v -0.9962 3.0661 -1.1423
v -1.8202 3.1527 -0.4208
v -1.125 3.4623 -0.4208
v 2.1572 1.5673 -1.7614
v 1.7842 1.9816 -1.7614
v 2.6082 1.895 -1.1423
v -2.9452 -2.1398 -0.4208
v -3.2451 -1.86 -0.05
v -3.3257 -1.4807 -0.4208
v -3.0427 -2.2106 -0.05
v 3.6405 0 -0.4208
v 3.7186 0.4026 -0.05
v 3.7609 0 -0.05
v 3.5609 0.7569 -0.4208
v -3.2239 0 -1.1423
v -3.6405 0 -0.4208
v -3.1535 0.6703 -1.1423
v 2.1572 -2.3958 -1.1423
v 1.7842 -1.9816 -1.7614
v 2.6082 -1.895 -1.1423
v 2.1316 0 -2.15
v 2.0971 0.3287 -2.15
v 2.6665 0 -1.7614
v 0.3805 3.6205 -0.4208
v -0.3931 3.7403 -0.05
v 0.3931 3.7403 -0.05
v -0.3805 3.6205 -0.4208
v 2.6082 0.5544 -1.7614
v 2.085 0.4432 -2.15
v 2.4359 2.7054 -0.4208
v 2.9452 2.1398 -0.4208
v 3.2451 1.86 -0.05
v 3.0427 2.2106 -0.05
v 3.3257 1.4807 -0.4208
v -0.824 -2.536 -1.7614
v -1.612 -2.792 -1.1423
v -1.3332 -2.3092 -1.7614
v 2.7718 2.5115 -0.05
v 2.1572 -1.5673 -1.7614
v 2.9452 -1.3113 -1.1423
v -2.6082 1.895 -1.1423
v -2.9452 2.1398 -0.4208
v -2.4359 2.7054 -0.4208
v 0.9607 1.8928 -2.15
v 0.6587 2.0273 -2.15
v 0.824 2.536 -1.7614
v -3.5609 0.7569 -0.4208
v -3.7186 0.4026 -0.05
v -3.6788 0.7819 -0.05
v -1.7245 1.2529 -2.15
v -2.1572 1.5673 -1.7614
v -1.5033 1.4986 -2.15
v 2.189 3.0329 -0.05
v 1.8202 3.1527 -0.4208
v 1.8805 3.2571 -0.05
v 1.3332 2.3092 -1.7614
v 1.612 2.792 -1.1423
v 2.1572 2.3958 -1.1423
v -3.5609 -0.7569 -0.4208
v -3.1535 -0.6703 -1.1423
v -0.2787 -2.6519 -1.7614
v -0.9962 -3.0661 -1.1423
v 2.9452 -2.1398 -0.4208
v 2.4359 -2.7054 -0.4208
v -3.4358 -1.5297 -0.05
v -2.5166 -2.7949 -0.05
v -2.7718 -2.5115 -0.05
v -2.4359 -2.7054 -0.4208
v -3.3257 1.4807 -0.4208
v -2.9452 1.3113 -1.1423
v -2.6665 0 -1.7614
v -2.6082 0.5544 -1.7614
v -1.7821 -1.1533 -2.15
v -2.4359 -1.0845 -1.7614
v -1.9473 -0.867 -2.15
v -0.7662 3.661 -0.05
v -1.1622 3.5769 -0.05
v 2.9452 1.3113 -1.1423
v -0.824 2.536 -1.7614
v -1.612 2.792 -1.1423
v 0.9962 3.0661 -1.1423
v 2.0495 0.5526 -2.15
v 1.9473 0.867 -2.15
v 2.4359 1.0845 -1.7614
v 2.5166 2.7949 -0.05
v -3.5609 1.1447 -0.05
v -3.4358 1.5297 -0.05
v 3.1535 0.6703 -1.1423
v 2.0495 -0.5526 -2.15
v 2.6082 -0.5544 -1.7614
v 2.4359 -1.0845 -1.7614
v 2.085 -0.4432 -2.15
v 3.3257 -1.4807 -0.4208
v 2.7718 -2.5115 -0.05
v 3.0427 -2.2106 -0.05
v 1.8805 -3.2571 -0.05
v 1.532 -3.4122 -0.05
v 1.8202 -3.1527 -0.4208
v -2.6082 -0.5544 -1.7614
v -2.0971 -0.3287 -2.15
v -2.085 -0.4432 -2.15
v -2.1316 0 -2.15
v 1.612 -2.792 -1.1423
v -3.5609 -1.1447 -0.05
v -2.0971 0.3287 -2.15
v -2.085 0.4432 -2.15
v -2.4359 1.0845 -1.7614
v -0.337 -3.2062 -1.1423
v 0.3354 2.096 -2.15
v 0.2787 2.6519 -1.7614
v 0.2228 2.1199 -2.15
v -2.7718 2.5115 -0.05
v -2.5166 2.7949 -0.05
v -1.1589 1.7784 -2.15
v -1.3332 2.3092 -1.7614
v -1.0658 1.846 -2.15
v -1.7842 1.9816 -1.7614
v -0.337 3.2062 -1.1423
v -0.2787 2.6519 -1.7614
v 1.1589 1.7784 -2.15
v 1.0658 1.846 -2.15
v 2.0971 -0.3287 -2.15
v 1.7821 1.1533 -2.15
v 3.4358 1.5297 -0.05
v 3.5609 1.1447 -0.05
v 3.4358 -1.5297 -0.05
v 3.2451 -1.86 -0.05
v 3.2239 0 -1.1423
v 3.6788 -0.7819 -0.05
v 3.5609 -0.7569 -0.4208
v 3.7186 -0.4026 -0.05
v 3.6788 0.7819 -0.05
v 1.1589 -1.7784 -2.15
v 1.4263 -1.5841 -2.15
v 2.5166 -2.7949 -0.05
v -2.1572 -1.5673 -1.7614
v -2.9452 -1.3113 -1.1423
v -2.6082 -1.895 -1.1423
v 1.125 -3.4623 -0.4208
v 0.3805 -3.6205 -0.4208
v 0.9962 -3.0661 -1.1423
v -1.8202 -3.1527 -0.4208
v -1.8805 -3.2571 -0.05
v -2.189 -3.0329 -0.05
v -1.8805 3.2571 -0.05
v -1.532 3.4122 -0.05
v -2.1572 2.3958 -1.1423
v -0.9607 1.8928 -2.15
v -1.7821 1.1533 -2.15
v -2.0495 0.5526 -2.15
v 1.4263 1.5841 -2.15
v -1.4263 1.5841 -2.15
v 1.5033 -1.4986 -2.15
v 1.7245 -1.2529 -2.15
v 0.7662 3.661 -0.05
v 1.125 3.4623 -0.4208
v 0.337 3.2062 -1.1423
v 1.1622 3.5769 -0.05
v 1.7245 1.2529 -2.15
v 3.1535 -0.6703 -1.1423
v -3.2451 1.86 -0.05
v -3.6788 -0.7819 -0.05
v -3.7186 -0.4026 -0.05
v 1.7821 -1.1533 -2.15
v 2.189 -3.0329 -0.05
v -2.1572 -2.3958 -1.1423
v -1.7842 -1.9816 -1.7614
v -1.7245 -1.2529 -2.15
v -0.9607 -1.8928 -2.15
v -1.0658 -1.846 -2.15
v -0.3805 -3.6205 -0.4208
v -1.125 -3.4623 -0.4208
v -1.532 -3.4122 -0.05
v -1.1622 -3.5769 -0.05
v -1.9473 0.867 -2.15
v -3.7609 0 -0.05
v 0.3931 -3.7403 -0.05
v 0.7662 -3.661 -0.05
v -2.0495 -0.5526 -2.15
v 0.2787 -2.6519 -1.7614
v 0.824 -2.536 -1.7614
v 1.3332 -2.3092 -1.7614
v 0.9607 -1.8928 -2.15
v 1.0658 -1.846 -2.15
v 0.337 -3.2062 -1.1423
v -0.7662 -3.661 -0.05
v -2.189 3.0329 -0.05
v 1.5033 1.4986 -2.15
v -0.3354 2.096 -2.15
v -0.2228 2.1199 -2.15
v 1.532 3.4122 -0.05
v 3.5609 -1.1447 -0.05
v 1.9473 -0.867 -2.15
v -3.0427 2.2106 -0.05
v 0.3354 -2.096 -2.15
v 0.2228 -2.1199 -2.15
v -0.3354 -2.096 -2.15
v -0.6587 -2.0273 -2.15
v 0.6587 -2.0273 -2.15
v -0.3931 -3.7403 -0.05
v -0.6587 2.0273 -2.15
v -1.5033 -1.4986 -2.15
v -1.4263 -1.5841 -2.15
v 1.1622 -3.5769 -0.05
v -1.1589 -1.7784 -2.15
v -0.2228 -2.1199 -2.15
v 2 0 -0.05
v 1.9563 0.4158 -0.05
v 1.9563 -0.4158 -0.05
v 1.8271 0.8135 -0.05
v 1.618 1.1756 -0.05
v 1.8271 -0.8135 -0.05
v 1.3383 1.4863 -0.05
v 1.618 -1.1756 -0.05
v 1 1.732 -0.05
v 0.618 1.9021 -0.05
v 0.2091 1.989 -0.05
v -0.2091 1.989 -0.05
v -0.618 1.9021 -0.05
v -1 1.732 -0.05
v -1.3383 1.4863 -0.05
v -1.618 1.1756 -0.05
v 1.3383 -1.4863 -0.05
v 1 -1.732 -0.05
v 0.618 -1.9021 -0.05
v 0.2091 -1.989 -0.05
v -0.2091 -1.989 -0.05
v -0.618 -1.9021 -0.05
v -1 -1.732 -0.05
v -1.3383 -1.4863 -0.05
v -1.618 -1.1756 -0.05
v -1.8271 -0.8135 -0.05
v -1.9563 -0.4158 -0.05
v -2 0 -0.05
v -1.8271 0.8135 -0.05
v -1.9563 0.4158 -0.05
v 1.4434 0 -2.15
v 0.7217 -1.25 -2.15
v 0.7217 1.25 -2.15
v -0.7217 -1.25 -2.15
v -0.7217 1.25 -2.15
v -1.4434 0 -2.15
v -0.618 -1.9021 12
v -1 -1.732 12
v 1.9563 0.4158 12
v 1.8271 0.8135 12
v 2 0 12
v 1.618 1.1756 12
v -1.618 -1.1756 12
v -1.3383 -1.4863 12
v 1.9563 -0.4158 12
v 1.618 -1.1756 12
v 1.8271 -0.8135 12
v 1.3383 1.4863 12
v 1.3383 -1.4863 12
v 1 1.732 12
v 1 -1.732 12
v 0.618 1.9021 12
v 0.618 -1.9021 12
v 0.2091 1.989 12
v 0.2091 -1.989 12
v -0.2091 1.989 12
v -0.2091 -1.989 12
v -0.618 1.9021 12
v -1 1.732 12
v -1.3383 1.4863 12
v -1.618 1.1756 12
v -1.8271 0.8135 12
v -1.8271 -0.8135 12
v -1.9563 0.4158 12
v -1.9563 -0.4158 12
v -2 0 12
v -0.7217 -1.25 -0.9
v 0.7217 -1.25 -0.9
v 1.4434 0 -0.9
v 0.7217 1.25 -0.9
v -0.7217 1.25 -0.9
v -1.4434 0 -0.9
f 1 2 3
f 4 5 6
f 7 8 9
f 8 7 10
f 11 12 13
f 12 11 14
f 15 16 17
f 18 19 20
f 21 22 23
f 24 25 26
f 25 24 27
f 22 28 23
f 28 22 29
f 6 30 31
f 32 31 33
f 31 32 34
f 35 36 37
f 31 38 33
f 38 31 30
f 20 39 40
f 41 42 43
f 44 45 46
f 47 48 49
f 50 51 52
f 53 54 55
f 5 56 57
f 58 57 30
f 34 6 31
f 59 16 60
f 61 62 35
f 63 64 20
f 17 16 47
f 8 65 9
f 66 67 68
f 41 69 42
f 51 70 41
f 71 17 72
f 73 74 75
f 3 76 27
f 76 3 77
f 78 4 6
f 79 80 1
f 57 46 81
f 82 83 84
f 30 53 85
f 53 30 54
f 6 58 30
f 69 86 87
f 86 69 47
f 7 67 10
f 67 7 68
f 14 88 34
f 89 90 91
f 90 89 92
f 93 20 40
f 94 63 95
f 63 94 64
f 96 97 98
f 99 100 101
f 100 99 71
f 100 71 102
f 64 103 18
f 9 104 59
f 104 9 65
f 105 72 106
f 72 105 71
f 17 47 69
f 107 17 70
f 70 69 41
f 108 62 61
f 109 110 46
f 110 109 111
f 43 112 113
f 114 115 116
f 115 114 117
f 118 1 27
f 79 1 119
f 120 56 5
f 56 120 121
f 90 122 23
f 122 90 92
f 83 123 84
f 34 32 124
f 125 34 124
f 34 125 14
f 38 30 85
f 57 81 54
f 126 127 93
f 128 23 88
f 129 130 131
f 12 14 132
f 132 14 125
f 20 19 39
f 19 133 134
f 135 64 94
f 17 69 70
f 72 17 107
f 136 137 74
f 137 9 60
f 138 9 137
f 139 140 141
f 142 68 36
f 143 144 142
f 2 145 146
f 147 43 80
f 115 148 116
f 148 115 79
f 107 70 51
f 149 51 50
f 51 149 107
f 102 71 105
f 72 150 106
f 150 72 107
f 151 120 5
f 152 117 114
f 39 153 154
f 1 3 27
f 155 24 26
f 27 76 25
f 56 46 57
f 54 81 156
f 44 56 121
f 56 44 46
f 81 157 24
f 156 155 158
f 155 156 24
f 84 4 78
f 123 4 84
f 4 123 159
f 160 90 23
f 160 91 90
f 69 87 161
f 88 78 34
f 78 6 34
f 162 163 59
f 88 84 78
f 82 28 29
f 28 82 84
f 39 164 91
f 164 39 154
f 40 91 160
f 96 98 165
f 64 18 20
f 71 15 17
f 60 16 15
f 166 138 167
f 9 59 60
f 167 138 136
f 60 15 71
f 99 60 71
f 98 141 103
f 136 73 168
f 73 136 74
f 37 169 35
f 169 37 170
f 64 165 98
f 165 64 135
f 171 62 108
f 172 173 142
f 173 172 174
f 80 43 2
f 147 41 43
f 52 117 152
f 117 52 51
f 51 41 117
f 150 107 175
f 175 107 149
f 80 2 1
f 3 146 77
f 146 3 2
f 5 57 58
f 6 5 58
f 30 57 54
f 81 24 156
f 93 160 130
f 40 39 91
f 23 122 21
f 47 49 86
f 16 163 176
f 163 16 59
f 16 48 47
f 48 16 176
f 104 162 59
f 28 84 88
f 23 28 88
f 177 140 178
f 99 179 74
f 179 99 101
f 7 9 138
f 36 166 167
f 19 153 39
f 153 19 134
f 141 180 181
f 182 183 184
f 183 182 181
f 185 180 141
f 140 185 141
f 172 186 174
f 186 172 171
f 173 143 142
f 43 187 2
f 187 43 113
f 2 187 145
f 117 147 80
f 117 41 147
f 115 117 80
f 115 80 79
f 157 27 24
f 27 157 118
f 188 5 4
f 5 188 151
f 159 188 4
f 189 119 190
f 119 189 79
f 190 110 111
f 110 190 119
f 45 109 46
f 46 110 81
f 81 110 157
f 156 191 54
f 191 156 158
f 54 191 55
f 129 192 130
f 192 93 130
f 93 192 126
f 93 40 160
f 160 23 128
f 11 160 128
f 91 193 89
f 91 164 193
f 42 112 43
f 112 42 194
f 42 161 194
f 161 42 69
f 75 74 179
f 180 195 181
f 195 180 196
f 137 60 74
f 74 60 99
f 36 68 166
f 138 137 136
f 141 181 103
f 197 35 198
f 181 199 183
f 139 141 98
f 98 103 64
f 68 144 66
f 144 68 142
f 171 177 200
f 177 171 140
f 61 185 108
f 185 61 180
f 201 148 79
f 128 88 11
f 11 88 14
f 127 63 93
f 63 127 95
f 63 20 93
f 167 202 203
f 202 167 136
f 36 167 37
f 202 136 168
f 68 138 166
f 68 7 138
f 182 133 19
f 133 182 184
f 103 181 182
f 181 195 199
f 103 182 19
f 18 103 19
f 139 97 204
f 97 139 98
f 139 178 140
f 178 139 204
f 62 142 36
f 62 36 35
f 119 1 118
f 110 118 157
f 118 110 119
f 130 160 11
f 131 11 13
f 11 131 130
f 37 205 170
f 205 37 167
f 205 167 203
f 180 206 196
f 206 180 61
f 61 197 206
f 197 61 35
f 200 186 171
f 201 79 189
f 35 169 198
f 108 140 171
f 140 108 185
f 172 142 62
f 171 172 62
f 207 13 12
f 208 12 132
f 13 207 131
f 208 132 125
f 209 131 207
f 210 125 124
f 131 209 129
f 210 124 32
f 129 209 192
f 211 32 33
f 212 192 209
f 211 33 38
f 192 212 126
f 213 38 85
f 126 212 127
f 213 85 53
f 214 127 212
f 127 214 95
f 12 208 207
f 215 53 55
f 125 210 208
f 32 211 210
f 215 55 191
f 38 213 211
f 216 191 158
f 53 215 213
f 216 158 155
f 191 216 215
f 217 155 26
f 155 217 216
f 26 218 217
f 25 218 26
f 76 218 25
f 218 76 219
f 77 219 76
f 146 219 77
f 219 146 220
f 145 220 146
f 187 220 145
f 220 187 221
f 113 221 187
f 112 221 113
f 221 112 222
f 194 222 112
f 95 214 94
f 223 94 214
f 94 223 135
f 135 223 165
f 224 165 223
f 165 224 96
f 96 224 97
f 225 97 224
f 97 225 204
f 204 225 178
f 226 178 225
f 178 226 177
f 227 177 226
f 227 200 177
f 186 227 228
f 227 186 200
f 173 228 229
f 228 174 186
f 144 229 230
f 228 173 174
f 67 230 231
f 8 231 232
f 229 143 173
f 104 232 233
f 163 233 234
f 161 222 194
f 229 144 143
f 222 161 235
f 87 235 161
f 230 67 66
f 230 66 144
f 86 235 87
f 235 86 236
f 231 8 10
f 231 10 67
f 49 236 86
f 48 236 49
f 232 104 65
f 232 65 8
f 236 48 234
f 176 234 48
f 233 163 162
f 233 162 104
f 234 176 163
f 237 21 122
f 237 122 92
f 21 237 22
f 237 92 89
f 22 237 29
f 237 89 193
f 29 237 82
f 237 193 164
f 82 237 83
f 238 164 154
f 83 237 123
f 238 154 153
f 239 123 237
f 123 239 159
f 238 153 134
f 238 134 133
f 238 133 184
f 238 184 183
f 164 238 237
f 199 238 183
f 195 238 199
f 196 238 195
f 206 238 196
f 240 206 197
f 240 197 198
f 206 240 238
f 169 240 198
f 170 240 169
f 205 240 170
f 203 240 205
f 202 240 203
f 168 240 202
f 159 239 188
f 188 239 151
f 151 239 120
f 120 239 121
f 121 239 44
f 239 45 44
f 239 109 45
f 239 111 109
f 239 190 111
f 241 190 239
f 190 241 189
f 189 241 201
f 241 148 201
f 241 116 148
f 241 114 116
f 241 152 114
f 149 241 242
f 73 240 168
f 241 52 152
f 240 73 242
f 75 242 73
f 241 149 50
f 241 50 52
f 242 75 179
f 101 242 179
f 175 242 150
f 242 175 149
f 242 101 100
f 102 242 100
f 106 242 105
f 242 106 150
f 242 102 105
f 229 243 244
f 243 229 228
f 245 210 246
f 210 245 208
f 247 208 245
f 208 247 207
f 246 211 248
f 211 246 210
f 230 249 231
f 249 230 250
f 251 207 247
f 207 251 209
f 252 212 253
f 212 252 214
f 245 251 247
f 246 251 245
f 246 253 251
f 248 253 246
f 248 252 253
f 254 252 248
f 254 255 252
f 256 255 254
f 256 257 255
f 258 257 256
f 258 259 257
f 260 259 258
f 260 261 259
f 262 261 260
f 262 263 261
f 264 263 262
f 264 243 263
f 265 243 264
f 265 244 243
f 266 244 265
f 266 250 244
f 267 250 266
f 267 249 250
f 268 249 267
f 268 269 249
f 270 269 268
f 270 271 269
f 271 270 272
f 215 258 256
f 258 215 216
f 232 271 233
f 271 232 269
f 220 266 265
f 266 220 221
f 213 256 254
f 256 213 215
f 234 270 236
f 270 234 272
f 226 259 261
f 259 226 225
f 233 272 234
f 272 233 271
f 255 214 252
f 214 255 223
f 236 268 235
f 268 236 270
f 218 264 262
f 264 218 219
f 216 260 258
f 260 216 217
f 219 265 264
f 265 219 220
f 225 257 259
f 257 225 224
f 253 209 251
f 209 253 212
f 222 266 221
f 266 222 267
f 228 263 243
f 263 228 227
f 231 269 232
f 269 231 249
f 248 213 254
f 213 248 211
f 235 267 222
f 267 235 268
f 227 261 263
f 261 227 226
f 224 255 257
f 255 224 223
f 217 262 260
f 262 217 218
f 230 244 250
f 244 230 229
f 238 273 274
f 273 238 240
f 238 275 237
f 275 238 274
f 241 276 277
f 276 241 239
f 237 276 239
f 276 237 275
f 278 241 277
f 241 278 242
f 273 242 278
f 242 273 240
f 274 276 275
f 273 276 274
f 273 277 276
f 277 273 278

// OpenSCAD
/*
   Copyright 2018 Scott Bezek and the splitflap contributors

   Licensed under the Apache License, Version 2.0 (the "License");
   you may not use this file except in compliance with the License.
   You may obtain a copy of the License at

       http://www.apache.org/licenses/LICENSE-2.0

   Unless required by applicable law or agreed to in writing, software
   distributed under the License is distributed on an "AS IS" BASIS,
   WITHOUT WARRANTIES OR CONDITIONS OF ANY KIND, either express or implied.
   See the License for the specific language governing permissions and
   limitations under the License.
*/

module roughM4_7380(length) {
    eps = 0.1;
    thread_diameter = 4;
    head_diameter = 7.6;
    head_length = 2.2;
    driving_depth = 1.3;
    driving_apothem = 2.5/2;
    driving_radius = driving_apothem / cos(180/6);

    sphere_offset = 1.2;  // Just a guess
    sphere_radius = sqrt(sphere_offset*sphere_offset + (head_diameter/2)*(head_diameter/2));


    difference() {
        union() {
            translate([0, 0, -eps]) {
                cylinder(h=length+eps, d=thread_diameter, $fn=30);
            }
            difference() {
                translate([0, 0, sphere_offset]) {
                    sphere(sphere_radius, $fn=30);
                }
                translate([0, 0, sphere_radius]) {
                    cube([sphere_radius*2 + eps, sphere_radius*2 + eps, sphere_radius*2 + eps], center=true);
                }
                translate([0, 0, -sphere_radius - head_length]) {
                    cube([sphere_radius*2 + eps, sphere_radius*2 + eps, sphere_radius*2 + eps], center=true);
                }
            }
        }
        translate([0, 0, -head_length-eps]) {
            cylinder(h=driving_depth+eps, r=driving_radius, $fn=6);
        }
    }
}

roughM4_7380(12);

        module color_selector(c) {
            precision = 0.0000001;  // arbitrary
            function compare_floats(x, y, i=0) = 
                  (len(x) != len(y)) ? false  // if arrays differ in length, they can't be equal
                : (i >= len(x)) ? true  // if we've hit the end of the arrays without issue, we're equal
                : (x[i] - precision <= y[i]) && x[i] + precision >= y[i]
                    ? compare_floats(x, y, i+1)
                    : false;  // not equal, short circuit

            if (c == [1, 0.843, 0] || compare_floats(c, [1, 0.843, 0]))
                children();
        }
                    
